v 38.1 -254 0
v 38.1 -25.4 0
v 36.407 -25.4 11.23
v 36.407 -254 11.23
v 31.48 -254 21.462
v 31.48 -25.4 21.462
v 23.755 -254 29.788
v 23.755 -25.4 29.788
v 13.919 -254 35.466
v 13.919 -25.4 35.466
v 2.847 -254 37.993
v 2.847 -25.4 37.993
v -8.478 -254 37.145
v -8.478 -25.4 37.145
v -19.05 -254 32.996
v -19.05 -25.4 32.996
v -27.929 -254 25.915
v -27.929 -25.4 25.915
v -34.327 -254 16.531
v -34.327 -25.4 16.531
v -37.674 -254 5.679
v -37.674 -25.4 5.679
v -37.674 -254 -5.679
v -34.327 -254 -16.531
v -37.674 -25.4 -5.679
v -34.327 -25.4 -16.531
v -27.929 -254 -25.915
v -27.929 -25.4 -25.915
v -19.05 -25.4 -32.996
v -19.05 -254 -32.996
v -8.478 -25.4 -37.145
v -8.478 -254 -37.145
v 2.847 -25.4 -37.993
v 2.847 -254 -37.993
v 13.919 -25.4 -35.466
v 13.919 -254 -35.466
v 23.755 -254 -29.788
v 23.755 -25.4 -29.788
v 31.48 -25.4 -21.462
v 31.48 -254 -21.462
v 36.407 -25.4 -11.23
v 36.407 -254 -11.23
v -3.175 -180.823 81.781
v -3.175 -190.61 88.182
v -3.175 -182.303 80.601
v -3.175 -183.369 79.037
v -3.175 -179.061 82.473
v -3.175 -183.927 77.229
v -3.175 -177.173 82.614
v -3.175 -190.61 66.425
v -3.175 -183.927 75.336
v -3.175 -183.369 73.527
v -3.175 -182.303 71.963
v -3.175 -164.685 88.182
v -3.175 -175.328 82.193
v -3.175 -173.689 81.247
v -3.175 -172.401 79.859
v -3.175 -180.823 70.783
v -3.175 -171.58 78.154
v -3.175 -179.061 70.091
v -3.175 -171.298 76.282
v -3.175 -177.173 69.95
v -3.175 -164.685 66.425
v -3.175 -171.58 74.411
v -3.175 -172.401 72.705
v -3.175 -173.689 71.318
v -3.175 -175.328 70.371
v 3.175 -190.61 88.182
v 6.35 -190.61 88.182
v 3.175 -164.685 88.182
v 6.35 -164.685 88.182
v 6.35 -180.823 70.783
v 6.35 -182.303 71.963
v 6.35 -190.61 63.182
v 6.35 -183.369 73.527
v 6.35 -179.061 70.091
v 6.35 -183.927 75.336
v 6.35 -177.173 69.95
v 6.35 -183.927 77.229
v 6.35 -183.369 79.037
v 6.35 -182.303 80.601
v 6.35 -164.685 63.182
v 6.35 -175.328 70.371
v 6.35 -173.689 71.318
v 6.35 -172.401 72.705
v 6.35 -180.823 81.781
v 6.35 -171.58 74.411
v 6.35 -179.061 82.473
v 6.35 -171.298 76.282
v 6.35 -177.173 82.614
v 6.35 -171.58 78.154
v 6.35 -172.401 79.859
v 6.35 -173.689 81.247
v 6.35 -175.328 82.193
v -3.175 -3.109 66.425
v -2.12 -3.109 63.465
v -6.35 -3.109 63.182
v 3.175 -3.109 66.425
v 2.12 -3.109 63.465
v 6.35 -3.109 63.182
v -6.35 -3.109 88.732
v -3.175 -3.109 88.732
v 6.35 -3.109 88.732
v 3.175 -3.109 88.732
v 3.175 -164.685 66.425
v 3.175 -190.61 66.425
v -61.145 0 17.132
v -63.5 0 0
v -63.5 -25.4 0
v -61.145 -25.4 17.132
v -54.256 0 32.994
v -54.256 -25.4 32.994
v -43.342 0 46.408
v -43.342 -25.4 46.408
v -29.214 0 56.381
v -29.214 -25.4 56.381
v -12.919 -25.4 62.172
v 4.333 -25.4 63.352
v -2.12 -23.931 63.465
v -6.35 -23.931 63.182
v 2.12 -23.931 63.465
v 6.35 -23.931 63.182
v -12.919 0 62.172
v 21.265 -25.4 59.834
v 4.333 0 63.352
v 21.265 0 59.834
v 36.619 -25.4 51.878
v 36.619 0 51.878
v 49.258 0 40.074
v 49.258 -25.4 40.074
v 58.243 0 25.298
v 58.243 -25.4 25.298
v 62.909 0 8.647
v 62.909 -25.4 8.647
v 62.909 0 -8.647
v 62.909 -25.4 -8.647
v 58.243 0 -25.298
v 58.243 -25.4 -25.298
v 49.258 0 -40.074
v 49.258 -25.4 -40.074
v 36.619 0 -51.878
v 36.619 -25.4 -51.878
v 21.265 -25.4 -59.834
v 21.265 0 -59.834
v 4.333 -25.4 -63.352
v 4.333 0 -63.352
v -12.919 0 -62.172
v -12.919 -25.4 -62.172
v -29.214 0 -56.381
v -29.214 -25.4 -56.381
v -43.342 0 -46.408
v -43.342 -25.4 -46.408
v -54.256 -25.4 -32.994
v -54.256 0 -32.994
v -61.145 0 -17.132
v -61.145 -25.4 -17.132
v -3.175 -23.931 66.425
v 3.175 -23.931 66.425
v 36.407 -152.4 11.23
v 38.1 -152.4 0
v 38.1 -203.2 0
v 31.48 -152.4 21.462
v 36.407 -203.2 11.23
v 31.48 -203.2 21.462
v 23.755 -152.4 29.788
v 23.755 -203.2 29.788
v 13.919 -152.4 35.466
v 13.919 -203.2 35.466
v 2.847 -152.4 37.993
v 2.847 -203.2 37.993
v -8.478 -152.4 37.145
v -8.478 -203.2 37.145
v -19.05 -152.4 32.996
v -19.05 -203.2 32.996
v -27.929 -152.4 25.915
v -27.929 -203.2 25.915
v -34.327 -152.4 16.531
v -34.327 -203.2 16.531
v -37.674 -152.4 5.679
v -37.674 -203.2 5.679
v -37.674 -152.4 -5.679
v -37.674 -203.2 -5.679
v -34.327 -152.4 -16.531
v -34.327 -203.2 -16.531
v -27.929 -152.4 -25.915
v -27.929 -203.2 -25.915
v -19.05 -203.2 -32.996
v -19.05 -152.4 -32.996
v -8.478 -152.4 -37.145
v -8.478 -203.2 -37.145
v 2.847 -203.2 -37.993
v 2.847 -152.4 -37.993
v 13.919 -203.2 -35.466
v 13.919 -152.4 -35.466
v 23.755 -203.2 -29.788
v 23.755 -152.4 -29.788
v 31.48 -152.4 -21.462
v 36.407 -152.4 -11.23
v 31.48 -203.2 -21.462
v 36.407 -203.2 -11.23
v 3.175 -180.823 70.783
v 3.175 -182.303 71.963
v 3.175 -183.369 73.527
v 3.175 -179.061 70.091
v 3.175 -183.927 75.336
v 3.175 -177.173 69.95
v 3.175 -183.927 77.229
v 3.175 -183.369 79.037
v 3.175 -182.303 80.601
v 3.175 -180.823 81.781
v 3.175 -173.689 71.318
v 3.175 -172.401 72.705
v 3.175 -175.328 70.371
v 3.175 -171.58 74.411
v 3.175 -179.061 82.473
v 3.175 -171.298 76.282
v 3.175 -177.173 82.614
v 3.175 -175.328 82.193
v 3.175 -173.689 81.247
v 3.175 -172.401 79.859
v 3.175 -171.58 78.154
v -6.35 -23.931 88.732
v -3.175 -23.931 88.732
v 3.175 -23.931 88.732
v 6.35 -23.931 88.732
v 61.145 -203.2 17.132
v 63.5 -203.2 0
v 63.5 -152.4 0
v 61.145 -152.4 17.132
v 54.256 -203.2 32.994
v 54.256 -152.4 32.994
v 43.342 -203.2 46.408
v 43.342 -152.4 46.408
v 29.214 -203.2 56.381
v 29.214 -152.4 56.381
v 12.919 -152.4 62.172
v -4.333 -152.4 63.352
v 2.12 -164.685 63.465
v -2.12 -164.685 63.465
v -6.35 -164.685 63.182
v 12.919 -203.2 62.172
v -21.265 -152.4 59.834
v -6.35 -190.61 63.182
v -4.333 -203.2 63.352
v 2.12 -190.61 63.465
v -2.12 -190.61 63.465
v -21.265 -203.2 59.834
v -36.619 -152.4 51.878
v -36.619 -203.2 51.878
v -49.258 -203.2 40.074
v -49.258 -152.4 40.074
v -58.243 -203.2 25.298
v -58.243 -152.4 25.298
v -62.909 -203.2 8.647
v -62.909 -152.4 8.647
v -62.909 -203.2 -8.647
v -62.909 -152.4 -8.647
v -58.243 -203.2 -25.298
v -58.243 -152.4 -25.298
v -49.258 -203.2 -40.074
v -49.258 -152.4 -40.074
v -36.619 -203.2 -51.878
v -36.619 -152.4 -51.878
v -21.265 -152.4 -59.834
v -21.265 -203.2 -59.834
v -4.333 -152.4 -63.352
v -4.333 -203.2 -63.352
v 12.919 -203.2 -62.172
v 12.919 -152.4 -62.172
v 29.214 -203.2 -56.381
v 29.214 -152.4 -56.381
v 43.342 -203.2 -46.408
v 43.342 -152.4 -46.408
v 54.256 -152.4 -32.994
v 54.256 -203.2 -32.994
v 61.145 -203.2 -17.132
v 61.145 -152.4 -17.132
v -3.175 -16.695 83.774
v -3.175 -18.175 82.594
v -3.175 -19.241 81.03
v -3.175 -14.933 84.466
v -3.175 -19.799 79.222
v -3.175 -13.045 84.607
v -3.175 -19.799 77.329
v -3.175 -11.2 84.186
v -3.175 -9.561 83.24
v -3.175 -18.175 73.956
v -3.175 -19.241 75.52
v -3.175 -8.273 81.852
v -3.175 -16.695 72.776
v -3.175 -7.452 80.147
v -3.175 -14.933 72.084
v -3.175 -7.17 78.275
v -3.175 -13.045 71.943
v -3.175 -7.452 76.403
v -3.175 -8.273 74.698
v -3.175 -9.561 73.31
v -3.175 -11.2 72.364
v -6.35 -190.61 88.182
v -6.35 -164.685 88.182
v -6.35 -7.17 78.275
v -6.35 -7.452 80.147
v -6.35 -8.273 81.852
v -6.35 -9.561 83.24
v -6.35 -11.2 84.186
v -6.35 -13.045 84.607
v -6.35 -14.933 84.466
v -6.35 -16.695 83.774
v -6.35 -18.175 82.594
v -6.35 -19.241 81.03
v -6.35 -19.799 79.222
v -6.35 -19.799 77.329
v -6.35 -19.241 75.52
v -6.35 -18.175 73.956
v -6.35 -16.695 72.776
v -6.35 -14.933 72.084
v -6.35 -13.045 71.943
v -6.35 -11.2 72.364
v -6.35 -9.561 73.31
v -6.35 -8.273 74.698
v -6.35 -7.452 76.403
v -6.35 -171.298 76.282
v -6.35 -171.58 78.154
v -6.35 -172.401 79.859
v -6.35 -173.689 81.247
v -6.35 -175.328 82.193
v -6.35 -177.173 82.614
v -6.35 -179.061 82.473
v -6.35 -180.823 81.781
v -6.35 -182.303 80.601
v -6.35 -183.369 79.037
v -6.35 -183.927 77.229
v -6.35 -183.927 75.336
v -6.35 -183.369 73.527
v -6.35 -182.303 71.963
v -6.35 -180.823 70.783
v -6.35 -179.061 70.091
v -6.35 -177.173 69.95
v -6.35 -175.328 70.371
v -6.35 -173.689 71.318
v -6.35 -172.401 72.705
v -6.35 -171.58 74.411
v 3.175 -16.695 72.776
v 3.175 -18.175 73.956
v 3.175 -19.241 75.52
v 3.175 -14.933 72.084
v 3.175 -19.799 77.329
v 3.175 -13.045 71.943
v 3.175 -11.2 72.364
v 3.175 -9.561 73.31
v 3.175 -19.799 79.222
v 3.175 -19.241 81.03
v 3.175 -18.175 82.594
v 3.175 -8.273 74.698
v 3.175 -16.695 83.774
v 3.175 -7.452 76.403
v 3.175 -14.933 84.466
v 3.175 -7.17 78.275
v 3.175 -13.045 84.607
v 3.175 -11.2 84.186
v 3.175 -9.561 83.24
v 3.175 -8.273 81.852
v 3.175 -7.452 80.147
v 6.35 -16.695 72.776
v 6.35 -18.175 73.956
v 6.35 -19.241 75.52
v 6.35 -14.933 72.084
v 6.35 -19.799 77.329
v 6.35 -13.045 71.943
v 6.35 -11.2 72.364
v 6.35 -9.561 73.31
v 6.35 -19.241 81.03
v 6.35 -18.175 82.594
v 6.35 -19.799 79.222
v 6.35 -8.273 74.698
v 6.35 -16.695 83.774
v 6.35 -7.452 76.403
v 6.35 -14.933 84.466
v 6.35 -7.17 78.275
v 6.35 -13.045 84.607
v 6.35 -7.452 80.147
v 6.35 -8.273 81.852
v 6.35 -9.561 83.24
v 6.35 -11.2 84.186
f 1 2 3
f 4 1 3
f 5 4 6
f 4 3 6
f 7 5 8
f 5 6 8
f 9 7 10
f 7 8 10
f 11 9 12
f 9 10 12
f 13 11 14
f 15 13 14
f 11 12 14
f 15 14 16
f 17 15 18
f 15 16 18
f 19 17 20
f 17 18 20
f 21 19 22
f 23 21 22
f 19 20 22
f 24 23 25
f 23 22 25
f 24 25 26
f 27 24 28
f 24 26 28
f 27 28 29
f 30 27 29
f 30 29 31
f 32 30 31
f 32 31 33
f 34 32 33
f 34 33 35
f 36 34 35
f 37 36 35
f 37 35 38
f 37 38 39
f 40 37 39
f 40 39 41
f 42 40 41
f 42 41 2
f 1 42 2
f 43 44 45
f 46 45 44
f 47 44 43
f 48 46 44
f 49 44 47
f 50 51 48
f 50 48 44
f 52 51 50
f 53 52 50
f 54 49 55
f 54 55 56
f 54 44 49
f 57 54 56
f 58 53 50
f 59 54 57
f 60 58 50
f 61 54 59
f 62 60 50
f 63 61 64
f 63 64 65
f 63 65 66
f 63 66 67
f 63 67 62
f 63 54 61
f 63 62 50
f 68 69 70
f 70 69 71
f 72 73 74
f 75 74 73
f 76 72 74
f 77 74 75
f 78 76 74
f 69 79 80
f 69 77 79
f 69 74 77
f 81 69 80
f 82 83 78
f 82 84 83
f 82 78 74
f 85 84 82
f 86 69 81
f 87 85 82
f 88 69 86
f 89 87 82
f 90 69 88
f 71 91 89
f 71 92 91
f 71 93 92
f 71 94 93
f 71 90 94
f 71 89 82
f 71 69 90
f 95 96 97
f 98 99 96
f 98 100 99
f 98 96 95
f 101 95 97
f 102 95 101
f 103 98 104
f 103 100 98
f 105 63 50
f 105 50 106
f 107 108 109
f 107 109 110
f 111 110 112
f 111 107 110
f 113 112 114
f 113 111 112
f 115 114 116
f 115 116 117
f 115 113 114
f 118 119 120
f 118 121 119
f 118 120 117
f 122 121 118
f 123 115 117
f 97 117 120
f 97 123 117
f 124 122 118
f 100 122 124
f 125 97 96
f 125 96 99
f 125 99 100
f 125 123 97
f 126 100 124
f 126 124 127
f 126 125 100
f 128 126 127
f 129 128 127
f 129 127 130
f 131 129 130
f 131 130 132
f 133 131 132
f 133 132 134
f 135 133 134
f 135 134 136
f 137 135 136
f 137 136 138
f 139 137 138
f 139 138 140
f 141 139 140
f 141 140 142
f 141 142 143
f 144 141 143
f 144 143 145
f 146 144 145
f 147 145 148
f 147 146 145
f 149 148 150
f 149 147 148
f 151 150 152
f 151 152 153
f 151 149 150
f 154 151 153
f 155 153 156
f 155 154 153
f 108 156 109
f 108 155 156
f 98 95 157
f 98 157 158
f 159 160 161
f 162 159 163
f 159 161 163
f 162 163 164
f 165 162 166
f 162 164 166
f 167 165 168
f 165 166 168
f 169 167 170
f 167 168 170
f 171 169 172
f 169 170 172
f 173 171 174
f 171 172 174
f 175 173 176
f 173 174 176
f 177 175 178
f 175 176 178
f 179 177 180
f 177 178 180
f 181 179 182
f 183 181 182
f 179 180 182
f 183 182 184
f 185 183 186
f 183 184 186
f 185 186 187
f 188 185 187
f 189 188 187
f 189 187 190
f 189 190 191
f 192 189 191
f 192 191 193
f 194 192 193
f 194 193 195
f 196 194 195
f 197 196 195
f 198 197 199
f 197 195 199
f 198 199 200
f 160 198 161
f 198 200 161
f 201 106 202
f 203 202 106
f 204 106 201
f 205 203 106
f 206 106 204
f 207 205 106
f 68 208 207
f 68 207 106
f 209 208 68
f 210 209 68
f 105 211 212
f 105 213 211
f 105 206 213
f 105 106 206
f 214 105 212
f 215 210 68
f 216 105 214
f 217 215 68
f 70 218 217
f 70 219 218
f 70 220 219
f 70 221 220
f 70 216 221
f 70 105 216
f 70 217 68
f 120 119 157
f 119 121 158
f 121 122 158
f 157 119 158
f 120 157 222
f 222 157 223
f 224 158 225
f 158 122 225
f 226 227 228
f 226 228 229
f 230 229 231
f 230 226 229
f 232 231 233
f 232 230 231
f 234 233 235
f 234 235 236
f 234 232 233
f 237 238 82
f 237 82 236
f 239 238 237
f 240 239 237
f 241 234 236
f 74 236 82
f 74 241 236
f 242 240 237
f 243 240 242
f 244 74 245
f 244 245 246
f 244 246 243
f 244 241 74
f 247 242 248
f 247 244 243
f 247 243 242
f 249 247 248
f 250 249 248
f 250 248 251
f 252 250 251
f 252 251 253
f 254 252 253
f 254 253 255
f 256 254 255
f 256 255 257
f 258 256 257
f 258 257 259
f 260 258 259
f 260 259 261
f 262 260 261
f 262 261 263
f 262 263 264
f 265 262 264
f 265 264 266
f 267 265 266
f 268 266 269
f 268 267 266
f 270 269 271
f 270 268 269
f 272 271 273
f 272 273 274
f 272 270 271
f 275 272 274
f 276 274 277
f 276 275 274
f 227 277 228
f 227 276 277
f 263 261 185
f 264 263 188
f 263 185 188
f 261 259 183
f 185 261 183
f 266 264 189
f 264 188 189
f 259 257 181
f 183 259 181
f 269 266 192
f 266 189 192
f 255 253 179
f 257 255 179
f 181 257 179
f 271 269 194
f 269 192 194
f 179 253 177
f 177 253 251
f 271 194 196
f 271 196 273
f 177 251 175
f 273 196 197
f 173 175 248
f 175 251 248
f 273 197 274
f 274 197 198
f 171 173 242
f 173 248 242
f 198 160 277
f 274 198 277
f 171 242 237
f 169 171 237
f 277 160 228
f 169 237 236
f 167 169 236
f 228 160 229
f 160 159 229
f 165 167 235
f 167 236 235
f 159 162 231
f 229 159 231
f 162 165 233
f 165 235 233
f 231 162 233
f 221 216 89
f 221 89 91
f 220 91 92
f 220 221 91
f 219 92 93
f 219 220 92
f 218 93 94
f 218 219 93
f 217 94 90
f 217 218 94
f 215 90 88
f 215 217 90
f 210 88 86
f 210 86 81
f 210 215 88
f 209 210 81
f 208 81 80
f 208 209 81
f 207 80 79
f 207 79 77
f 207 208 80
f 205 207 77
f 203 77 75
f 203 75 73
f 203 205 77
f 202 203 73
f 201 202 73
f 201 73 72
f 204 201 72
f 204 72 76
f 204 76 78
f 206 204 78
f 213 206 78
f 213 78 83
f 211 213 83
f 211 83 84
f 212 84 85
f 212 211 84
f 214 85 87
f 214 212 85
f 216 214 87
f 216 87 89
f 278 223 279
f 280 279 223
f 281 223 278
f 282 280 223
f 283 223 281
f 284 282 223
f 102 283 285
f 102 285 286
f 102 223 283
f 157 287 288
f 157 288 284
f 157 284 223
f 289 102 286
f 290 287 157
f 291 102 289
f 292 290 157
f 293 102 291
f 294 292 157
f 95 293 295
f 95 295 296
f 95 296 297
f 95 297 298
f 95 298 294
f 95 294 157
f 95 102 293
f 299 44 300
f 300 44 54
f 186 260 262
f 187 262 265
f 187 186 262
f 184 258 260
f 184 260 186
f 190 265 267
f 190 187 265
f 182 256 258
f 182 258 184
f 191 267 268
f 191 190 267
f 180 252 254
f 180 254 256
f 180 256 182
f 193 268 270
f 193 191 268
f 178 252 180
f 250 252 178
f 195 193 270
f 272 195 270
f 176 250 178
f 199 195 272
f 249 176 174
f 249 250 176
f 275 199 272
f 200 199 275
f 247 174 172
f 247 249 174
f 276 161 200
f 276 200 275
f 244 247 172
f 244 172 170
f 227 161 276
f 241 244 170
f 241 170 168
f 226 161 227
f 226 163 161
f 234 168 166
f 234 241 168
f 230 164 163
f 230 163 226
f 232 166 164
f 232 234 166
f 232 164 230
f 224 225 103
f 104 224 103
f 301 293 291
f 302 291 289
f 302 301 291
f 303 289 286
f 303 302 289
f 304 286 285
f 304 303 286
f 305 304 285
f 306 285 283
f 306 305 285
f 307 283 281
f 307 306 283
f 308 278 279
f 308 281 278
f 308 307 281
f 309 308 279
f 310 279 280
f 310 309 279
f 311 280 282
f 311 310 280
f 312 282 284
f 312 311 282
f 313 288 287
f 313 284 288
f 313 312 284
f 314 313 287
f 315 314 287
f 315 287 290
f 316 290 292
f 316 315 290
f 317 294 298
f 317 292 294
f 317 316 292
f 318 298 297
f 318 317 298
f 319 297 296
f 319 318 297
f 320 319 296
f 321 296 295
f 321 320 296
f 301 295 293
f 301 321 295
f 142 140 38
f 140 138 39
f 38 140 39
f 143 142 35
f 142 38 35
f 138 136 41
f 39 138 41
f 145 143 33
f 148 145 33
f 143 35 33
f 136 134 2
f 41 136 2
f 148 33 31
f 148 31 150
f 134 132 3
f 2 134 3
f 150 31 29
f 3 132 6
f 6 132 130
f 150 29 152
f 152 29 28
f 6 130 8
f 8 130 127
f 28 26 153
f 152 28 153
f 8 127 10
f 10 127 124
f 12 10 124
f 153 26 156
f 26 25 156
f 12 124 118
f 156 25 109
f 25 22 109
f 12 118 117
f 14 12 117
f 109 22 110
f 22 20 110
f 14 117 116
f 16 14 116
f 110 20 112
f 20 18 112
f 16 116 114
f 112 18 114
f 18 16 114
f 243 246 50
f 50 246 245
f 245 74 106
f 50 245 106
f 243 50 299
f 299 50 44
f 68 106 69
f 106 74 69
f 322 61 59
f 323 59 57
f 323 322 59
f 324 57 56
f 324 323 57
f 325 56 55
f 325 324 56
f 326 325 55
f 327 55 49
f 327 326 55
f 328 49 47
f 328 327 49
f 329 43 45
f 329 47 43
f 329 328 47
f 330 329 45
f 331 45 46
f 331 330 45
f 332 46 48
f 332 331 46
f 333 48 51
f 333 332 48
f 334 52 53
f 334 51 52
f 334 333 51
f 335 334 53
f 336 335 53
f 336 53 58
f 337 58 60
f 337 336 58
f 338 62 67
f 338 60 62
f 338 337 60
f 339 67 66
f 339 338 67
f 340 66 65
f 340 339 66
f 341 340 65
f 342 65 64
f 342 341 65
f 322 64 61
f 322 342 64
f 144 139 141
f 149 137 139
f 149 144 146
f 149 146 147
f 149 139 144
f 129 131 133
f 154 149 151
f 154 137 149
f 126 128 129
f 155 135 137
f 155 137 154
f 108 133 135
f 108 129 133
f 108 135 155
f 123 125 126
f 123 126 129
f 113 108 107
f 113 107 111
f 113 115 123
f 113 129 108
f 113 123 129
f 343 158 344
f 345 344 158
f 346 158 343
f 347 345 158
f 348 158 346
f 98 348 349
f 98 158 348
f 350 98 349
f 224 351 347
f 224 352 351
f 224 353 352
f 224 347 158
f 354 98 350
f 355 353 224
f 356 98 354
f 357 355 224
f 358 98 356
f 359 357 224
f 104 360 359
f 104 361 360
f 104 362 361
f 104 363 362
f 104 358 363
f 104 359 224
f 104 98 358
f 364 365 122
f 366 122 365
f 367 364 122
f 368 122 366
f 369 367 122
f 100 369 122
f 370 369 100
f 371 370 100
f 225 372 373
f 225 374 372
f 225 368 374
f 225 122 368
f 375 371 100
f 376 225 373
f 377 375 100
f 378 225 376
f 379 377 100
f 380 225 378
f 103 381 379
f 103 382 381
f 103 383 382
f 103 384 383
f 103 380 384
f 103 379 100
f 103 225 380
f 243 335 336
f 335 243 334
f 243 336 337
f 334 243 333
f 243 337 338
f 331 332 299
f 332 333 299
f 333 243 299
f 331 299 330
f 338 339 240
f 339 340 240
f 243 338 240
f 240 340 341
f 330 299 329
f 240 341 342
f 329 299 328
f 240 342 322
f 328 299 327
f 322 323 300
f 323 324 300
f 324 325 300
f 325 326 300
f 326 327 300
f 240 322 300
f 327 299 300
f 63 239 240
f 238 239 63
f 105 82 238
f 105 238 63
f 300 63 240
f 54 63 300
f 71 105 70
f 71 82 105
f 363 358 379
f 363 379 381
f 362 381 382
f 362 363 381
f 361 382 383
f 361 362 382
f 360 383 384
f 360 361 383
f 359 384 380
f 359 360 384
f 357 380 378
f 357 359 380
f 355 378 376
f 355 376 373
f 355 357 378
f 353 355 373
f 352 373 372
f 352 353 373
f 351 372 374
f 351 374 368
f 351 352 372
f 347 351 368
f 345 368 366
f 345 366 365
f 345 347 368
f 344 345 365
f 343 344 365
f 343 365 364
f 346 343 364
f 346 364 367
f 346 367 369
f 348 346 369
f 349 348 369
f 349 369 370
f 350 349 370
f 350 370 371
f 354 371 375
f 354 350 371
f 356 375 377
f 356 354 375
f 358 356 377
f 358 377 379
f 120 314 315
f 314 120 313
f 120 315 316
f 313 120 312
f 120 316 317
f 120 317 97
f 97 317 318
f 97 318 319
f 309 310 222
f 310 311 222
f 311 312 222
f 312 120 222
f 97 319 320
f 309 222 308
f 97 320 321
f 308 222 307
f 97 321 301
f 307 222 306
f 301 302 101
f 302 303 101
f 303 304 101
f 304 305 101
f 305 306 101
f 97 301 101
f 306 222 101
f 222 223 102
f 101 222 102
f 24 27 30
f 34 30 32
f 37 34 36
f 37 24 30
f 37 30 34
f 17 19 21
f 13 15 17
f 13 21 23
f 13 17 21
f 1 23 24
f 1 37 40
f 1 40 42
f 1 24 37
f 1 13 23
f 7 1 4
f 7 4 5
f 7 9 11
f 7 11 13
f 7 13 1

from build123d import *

# Parameters (mm, degrees)
F0_R      = 38.1
F1_DEPTH  = 254
F2_R      = 63.5
F3_DEPTH  = 25.4
F4_R      = 63.5
F4_R_2    = 38.1
F5_DEPTH  = 50.8
F7_W      = 25.925078
F7_H      = 38.211462
F7_R      = 6.35
F8_DEPTH  = 6.35
F9_W      = 20.821888
F9_H      = 35.750796
F9_R      = 6.35
F10_DEPTH = 6.35
F12_DEPTH = 254


with BuildPart() as f1:
    # F0 (on Front) → F1 (new body)
    with BuildSketch(Plane.XZ):
        Circle(F0_R)
    extrude(amount=F1_DEPTH)

    # F2 (on face) → F3 (join)
    with BuildSketch(Plane(origin=(0, 0, 0), x_dir=(-1, 0, 0), z_dir=(0, 1, 0))):
        Circle(F2_R)
    extrude(amount=-F3_DEPTH)

    # F9 (on Right) → F10 (join, symmetric)
    with BuildSketch(Plane.YZ):
        with Locations((-13.519792, 70.856152)):
            Rectangle(F9_W, F9_H)
        with Locations((-13.519792, 78.275084)):
            Circle(F9_R, mode=Mode.SUBTRACT)
    extrude(amount=F10_DEPTH, both=True)


with BuildPart() as f5:
    # F4 (on face) → F5 (new body)
    with BuildSketch(Plane.XZ.offset(254)):
        Circle(F4_R)
        Circle(F4_R_2, mode=Mode.SUBTRACT)
    extrude(amount=-F5_DEPTH)


with BuildPart() as f5_1:
    # F6: moved
    add(f5.part.moved(Location((0, 50.8, 0))))

    # F7 (on Right) → F8 (join, symmetric)
    with BuildSketch(Plane.YZ):
        with Locations((-177.647777, 69.075886)):
            Rectangle(F7_W, F7_H)
        with Locations((-177.647777, 76.282203)):
            Circle(F7_R, mode=Mode.SUBTRACT)
    extrude(amount=F8_DEPTH, both=True)


with BuildPart() as f12_tool:
    # F11 (on Front) → F12 (new body)
    with BuildSketch(Plane.XZ):
        Polygon((-3.175, 66.425036), (0, 66.425036), (3.175, 66.425036), (3.175, 90.221232), (0, 90.221232), (-3.175, 90.221232), align=None)
    extrude(amount=F12_DEPTH)


with BuildPart() as f1_1:
    add(f1.part)

    # F12: cut by f12_tool
    add(f12_tool.part, mode=Mode.SUBTRACT)


with BuildPart() as f5_2:
    add(f5_1.part)

    # F12: cut by f12_tool
    add(f12_tool.part, mode=Mode.SUBTRACT)


solid = Compound([f1_1.part, f5_2.part])
